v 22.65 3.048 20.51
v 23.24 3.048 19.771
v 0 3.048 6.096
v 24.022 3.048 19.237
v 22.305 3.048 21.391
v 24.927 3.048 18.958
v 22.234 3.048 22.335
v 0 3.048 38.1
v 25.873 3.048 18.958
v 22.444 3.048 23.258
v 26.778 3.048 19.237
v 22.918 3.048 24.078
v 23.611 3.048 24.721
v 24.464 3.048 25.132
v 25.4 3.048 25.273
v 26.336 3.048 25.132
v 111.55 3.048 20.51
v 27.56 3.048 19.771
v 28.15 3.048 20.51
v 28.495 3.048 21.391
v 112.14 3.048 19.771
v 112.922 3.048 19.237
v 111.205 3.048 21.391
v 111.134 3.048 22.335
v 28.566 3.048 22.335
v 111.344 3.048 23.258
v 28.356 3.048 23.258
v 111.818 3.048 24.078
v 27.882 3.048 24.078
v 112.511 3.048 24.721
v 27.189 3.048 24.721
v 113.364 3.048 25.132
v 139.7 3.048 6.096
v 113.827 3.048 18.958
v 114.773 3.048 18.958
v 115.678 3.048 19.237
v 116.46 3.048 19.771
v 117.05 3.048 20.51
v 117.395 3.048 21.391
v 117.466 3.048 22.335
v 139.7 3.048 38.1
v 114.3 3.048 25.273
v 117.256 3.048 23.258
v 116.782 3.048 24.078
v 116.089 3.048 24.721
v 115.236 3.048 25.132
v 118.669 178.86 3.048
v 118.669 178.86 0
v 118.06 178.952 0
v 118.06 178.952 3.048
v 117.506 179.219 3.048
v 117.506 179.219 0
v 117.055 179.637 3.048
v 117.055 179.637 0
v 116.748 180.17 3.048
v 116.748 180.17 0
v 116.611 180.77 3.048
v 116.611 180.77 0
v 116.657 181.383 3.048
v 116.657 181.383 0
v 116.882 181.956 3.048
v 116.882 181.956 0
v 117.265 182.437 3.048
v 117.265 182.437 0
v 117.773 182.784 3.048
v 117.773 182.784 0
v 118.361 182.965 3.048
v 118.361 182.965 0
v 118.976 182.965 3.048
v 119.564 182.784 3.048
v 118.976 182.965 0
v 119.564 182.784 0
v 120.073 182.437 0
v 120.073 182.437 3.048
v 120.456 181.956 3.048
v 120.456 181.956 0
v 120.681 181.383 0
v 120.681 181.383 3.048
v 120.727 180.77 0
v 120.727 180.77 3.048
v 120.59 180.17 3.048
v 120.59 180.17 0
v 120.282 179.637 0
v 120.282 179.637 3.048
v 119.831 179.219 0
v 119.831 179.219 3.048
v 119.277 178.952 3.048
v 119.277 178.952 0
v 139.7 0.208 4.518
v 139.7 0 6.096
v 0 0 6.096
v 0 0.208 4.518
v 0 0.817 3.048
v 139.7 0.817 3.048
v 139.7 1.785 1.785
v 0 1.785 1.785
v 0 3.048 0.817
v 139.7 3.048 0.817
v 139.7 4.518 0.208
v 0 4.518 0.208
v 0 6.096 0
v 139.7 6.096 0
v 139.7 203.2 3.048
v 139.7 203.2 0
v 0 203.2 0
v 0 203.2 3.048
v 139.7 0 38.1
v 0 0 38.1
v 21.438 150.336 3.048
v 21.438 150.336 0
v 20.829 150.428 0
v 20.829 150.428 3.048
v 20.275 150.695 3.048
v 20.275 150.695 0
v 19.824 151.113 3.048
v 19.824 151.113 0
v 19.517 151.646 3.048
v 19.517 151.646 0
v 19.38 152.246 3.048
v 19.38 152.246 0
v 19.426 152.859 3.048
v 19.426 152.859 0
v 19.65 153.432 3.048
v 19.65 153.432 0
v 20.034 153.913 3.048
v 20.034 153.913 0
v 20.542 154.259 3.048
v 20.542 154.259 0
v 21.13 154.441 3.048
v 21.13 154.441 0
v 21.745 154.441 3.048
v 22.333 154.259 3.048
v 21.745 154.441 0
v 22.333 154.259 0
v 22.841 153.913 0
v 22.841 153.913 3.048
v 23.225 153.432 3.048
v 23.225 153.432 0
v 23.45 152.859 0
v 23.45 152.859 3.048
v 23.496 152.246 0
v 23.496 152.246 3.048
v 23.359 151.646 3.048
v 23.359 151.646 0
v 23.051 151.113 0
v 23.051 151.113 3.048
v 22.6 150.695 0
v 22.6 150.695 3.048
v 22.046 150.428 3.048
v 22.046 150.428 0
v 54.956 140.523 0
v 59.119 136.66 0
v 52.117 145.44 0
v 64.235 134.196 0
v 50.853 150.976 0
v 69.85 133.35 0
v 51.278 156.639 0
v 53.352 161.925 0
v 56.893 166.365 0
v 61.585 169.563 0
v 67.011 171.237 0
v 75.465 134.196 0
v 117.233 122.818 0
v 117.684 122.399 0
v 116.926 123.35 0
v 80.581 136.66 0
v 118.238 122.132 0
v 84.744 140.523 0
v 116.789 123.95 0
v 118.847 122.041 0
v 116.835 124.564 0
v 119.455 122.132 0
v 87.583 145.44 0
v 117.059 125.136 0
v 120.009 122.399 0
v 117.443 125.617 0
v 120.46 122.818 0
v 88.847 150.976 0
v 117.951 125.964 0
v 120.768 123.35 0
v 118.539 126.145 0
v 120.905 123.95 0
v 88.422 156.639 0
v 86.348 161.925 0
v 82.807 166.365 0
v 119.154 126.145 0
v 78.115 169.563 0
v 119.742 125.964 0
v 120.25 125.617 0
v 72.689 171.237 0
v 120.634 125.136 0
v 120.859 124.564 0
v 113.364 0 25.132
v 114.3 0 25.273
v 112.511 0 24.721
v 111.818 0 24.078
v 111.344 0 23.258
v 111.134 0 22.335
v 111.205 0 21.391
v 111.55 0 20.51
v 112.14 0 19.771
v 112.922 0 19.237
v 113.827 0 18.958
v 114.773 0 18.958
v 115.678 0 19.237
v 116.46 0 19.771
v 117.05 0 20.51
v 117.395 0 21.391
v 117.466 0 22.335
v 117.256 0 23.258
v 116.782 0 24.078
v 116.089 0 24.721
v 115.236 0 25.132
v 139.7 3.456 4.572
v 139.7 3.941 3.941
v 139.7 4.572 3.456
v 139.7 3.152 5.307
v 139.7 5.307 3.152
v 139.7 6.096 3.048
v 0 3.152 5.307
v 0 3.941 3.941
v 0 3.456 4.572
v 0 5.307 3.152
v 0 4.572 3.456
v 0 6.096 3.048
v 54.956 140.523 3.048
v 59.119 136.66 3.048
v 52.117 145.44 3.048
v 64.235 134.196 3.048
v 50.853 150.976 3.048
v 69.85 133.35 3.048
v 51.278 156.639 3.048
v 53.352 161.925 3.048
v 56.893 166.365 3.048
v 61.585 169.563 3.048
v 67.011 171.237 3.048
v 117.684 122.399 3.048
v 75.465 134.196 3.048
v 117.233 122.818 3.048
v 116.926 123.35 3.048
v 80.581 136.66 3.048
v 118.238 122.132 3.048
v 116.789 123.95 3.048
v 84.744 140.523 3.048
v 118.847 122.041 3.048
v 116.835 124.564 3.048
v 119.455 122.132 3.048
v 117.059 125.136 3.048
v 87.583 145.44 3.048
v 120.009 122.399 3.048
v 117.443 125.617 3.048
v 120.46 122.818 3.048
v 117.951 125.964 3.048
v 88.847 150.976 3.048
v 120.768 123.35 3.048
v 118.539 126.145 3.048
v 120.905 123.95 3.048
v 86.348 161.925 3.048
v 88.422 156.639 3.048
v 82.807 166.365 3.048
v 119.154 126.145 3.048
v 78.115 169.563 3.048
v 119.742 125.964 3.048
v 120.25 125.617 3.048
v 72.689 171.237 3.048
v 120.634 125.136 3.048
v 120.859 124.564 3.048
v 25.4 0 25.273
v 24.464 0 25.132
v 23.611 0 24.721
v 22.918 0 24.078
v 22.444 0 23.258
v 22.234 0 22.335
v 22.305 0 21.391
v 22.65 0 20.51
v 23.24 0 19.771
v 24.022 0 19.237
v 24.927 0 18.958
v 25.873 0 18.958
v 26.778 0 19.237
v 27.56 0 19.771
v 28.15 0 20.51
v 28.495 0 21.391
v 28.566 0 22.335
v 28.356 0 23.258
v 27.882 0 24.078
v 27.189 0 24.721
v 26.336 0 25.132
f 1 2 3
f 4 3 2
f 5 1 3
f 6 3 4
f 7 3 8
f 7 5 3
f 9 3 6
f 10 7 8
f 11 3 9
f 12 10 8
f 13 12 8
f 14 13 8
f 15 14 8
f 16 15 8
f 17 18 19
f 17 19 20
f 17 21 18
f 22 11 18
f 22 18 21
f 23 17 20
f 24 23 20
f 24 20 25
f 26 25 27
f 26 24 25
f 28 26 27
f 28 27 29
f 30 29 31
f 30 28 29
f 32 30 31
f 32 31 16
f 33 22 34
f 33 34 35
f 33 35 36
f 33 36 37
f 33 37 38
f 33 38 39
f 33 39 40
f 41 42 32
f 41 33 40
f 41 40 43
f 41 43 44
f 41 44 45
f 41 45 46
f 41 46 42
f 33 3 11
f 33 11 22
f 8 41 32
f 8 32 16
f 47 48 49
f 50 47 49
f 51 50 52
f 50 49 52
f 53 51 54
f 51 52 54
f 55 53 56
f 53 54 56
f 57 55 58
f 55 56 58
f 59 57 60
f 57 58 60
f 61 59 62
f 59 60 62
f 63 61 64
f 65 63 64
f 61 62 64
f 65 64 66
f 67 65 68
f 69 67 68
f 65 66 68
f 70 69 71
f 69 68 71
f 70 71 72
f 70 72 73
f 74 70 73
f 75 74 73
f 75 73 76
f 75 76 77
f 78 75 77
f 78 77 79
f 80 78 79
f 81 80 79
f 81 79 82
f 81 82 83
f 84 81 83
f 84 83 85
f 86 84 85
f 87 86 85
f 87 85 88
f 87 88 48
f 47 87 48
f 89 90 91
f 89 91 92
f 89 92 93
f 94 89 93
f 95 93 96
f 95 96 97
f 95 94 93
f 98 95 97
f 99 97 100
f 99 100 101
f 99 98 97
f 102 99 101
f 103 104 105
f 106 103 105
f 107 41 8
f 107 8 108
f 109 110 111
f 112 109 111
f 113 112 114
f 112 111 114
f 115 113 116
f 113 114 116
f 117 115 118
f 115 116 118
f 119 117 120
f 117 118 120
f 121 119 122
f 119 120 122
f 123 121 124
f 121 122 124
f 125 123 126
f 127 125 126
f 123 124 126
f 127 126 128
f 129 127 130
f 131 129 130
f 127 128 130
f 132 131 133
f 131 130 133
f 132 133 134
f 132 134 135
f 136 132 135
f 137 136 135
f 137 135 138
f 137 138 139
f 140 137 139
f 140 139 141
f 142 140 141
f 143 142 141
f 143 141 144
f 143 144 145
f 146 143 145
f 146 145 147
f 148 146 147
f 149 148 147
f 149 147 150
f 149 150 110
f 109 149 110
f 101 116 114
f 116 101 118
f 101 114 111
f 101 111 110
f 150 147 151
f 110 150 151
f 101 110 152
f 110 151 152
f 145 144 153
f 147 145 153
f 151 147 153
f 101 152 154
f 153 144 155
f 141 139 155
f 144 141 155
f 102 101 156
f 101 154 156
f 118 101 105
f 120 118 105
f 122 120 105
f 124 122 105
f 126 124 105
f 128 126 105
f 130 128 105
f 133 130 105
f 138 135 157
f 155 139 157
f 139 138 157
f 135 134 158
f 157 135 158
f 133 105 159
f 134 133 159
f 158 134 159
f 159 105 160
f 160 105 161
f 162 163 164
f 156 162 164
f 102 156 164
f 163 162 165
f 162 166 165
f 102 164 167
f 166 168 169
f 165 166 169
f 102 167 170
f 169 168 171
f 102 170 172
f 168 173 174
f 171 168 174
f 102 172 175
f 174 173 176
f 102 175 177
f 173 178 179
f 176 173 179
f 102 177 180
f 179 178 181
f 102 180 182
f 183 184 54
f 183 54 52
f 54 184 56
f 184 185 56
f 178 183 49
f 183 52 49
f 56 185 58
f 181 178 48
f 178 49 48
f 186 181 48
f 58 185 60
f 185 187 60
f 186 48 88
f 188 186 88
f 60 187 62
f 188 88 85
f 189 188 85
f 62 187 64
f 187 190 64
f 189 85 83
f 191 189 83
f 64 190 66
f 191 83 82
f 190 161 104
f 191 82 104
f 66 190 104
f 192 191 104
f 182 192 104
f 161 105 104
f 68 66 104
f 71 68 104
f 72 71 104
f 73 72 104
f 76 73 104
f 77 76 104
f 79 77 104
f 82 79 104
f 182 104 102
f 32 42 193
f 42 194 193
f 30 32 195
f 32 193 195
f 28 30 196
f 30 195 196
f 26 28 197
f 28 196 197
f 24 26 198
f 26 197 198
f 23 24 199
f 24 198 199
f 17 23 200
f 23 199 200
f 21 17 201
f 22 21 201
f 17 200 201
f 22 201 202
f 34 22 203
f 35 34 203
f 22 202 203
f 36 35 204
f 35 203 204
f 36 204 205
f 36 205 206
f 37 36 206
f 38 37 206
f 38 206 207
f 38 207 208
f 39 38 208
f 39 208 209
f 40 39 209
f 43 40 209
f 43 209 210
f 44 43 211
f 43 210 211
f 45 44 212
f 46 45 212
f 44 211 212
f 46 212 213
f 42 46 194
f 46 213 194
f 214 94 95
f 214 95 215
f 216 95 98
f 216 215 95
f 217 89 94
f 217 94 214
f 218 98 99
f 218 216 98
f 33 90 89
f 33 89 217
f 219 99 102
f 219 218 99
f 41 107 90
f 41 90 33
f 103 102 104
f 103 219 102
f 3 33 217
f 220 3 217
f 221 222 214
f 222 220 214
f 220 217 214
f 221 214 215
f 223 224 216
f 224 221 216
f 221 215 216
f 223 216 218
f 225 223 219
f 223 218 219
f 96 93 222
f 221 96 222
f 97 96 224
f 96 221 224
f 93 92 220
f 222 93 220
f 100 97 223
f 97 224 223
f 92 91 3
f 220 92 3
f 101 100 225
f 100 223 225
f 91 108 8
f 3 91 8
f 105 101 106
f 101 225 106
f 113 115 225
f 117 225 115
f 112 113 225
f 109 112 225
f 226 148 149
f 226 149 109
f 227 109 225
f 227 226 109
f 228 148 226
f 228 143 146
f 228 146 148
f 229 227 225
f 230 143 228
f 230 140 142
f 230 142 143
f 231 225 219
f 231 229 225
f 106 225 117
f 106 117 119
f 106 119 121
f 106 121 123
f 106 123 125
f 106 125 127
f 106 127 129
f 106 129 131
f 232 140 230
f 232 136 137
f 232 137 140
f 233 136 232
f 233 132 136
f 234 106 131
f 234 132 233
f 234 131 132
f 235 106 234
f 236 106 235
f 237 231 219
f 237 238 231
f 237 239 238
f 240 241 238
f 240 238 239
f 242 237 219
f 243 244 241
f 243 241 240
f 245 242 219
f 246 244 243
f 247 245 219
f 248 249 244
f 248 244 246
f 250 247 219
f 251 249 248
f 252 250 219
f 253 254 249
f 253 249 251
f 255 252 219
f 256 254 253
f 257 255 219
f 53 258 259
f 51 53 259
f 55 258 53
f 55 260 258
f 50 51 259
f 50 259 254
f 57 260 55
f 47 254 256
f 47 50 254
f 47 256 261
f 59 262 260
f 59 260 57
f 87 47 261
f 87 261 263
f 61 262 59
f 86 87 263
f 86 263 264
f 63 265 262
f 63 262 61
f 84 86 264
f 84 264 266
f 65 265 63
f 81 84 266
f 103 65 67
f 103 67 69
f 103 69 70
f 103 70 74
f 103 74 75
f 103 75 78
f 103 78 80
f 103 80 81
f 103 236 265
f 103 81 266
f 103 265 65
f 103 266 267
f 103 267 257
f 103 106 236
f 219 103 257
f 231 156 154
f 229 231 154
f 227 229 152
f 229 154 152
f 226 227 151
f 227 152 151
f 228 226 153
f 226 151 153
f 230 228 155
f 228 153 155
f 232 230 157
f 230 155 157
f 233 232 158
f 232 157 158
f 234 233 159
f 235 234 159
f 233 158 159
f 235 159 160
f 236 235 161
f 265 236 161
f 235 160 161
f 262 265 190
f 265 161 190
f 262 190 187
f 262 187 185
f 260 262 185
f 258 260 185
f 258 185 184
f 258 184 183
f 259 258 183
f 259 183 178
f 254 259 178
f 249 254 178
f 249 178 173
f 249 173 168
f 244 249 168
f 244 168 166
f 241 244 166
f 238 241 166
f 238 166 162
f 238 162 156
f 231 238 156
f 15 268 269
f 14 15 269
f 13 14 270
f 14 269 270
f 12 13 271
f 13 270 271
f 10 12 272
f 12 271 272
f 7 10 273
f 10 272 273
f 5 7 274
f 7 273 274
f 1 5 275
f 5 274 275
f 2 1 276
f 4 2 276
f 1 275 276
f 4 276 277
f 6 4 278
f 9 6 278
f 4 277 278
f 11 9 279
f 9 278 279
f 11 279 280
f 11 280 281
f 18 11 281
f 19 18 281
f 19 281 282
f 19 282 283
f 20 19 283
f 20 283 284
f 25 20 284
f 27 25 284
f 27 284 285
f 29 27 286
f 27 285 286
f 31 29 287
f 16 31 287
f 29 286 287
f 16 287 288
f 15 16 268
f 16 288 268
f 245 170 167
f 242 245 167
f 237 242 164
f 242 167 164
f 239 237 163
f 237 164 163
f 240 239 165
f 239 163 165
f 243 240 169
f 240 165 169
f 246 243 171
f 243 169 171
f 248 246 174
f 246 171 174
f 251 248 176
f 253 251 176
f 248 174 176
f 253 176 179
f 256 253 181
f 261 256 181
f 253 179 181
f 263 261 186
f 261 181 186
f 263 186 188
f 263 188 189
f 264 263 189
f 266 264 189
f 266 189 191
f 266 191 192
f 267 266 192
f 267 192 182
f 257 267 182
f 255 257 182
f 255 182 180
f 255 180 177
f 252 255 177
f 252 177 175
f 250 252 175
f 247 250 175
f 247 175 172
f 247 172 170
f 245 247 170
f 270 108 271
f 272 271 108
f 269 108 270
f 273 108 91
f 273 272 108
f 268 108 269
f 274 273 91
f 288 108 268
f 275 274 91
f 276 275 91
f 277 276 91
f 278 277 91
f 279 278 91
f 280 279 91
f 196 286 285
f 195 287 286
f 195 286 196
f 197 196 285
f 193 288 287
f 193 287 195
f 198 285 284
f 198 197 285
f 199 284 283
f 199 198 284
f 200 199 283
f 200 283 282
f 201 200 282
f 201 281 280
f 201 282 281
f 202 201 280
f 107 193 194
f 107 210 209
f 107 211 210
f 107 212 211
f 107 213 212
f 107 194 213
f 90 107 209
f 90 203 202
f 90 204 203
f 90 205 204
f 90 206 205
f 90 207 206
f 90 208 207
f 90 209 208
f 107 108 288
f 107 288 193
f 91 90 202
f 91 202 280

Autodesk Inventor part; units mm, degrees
ref_plane "YZ Plane" through (0, 0, 0) normal (1, 0, 0) x (0, 1, 0)
ref_plane "XZ Plane" through (0, 0, 0) normal (0, 1, 0) x (-1, 0, 0)
ref_plane "XY Plane" through (0, 0, 0) normal (0, 0, 1) x (1, 0, 0)
sketch "Sketch1" plane through (0, 0, 0) normal (0, 0, 1) x (1, 0, 0)
  line L0 (0, 0) -> (139.7, 0)
  line L1 (139.7, 0) -> (139.7, 203.2)
  line L2 (139.7, 203.2) -> (0, 203.2)
  line L3 (0, 203.2) -> (0, 0)
  dimension "d0" = 139.7
  dimension "d1" = 203.2
extrude "Plate1" add sketch "Sketch1" along normal blind 3.048
sketch "Sketch2" plane through (139.7, 3.048, 0) normal (0, -1, 0) x (1, 0, 0)
  line L0 (-139.7, 0) -> (0, 0)
  line L1 (0, 0) -> (0, 38.1)
  line L2 (0, 38.1) -> (-139.7, 38.1)
  line L3 (-139.7, 38.1) -> (-139.7, 0)
edge flange "Flange1" height 38.1 angle 90 thickness 3.048 bend radius 3.048 thickness toward (0, -1, 0) relief tear relief width 3.048 relief depth 1.524 edges at (69.85, 0, 3.048) wall of the first edge with corners at (0, 3.048, 0) (139.7, 3.048, 0) (139.7, 3.048, 38.1) (0, 3.048, 38.1)
bend "Bend1"
corner "Corner1"
sketch "Sketch3" plane through (0, 0, 3.048) normal (0, 0, 1) x (1, 0, 0)
  line L0 (139.7, 203.2) -> (139.7, 6.096) projected
  line L1 (0, 203.2) -> (139.7, 203.2) projected
  circle A0 centre (21.4376, 152.4) radius 2.0638
  circle A1 centre (118.8466, 124.1044) radius 2.0638
  circle A2 centre (118.6688, 180.9242) radius 2.0637
  point P0 (0, 0)
  dimension "d13" = 20.8534
  dimension "d14" = 79.0956
  dimension "d16" = 21.0312
  dimension "d18" = 50.8
  dimension "d19" = 22.2758
  dimension "d20" = 4.1275
  dimension "d21" = 4.1275
  dimension "d22" = 4.1275
  dimension "d39" = 118.2624
hole "Hole1" at (118.8466, 124.1044, 3.048) at (118.6688, 180.9242, 3.048) at (21.4376, 152.4, 3.048) direction (0, 0, -1) diameter 4.1275 end through all
sketch "Sketch4" plane through (0, 3.048, 38.1) normal (0, 1, 0) x (1, 0, 0)
  line L0 (0, 0) -> (0, 32.004) projected
  line L1 (139.7, 0) -> (139.7, 32.004) projected
  point P0 (0, 38.1)
  point P1 (25.4, 16.002)
  point P2 (114.3, 16.002)
  dimension "d30" = 25.4
  dimension "d31" = 25.4
hole "Hole2" at (25.4, 3.048, 22.098) at (114.3, 3.048, 22.098) direction (0, -1, 0) diameter 6.35 end through all
sketch "Sketch5" plane through (0, 0, 3.048) normal (0, 0, 1) x (1, 0, 0)
  line L0 (139.7, 203.2) -> (139.7, 6.096) projected
  line L1 (0, 203.2) -> (139.7, 203.2) projected
  point P0 (0, 0)
  point P1 (69.85, 152.4)
  dimension "d40" = 50.8
  dimension "d41" = 69.85
hole "Hole3" at (69.85, 152.4, 3.048) direction (0, 0, -1) diameter 38.1 end through all
equation "\"d28\" = Thickness"
equation "\"d37\" = Thickness"
equation "\"d47\" = Thickness"
equation "\"d3\" = BendReliefWidth"
equation "\"d4\" = BendReliefDepth"
equation "\"d5\" = MinimumRemnant"
equation "\"d6\" = BendRadius"
equation "\"d9\" = BendRadius"
equation "\"d10\" = CornerReliefSize"
equation "\"d11\" = GapSize"
equation "\"d12\" = JacobiRadiusSize"
equation "\"BendRadius\" = Thickness"
equation "\"BendReliefWidth\" = Thickness"
equation "\"BendReliefDepth\" = 0.5 * Thickness"
equation "\"CornerReliefSize\" = 4 * Thickness"
equation "\"MinimumRemnant\" = 2 * Thickness"
equation "\"TransitionRadius\" = BendRadius"
equation "\"JacobiRadiusSize\" = BendRadius"
equation "\"GapSize\" = Thickness"
equation "\"d2\" = BendRadius"
equation "\"Thickness\" = 3.048"
properties material "Aluminum 6061"
